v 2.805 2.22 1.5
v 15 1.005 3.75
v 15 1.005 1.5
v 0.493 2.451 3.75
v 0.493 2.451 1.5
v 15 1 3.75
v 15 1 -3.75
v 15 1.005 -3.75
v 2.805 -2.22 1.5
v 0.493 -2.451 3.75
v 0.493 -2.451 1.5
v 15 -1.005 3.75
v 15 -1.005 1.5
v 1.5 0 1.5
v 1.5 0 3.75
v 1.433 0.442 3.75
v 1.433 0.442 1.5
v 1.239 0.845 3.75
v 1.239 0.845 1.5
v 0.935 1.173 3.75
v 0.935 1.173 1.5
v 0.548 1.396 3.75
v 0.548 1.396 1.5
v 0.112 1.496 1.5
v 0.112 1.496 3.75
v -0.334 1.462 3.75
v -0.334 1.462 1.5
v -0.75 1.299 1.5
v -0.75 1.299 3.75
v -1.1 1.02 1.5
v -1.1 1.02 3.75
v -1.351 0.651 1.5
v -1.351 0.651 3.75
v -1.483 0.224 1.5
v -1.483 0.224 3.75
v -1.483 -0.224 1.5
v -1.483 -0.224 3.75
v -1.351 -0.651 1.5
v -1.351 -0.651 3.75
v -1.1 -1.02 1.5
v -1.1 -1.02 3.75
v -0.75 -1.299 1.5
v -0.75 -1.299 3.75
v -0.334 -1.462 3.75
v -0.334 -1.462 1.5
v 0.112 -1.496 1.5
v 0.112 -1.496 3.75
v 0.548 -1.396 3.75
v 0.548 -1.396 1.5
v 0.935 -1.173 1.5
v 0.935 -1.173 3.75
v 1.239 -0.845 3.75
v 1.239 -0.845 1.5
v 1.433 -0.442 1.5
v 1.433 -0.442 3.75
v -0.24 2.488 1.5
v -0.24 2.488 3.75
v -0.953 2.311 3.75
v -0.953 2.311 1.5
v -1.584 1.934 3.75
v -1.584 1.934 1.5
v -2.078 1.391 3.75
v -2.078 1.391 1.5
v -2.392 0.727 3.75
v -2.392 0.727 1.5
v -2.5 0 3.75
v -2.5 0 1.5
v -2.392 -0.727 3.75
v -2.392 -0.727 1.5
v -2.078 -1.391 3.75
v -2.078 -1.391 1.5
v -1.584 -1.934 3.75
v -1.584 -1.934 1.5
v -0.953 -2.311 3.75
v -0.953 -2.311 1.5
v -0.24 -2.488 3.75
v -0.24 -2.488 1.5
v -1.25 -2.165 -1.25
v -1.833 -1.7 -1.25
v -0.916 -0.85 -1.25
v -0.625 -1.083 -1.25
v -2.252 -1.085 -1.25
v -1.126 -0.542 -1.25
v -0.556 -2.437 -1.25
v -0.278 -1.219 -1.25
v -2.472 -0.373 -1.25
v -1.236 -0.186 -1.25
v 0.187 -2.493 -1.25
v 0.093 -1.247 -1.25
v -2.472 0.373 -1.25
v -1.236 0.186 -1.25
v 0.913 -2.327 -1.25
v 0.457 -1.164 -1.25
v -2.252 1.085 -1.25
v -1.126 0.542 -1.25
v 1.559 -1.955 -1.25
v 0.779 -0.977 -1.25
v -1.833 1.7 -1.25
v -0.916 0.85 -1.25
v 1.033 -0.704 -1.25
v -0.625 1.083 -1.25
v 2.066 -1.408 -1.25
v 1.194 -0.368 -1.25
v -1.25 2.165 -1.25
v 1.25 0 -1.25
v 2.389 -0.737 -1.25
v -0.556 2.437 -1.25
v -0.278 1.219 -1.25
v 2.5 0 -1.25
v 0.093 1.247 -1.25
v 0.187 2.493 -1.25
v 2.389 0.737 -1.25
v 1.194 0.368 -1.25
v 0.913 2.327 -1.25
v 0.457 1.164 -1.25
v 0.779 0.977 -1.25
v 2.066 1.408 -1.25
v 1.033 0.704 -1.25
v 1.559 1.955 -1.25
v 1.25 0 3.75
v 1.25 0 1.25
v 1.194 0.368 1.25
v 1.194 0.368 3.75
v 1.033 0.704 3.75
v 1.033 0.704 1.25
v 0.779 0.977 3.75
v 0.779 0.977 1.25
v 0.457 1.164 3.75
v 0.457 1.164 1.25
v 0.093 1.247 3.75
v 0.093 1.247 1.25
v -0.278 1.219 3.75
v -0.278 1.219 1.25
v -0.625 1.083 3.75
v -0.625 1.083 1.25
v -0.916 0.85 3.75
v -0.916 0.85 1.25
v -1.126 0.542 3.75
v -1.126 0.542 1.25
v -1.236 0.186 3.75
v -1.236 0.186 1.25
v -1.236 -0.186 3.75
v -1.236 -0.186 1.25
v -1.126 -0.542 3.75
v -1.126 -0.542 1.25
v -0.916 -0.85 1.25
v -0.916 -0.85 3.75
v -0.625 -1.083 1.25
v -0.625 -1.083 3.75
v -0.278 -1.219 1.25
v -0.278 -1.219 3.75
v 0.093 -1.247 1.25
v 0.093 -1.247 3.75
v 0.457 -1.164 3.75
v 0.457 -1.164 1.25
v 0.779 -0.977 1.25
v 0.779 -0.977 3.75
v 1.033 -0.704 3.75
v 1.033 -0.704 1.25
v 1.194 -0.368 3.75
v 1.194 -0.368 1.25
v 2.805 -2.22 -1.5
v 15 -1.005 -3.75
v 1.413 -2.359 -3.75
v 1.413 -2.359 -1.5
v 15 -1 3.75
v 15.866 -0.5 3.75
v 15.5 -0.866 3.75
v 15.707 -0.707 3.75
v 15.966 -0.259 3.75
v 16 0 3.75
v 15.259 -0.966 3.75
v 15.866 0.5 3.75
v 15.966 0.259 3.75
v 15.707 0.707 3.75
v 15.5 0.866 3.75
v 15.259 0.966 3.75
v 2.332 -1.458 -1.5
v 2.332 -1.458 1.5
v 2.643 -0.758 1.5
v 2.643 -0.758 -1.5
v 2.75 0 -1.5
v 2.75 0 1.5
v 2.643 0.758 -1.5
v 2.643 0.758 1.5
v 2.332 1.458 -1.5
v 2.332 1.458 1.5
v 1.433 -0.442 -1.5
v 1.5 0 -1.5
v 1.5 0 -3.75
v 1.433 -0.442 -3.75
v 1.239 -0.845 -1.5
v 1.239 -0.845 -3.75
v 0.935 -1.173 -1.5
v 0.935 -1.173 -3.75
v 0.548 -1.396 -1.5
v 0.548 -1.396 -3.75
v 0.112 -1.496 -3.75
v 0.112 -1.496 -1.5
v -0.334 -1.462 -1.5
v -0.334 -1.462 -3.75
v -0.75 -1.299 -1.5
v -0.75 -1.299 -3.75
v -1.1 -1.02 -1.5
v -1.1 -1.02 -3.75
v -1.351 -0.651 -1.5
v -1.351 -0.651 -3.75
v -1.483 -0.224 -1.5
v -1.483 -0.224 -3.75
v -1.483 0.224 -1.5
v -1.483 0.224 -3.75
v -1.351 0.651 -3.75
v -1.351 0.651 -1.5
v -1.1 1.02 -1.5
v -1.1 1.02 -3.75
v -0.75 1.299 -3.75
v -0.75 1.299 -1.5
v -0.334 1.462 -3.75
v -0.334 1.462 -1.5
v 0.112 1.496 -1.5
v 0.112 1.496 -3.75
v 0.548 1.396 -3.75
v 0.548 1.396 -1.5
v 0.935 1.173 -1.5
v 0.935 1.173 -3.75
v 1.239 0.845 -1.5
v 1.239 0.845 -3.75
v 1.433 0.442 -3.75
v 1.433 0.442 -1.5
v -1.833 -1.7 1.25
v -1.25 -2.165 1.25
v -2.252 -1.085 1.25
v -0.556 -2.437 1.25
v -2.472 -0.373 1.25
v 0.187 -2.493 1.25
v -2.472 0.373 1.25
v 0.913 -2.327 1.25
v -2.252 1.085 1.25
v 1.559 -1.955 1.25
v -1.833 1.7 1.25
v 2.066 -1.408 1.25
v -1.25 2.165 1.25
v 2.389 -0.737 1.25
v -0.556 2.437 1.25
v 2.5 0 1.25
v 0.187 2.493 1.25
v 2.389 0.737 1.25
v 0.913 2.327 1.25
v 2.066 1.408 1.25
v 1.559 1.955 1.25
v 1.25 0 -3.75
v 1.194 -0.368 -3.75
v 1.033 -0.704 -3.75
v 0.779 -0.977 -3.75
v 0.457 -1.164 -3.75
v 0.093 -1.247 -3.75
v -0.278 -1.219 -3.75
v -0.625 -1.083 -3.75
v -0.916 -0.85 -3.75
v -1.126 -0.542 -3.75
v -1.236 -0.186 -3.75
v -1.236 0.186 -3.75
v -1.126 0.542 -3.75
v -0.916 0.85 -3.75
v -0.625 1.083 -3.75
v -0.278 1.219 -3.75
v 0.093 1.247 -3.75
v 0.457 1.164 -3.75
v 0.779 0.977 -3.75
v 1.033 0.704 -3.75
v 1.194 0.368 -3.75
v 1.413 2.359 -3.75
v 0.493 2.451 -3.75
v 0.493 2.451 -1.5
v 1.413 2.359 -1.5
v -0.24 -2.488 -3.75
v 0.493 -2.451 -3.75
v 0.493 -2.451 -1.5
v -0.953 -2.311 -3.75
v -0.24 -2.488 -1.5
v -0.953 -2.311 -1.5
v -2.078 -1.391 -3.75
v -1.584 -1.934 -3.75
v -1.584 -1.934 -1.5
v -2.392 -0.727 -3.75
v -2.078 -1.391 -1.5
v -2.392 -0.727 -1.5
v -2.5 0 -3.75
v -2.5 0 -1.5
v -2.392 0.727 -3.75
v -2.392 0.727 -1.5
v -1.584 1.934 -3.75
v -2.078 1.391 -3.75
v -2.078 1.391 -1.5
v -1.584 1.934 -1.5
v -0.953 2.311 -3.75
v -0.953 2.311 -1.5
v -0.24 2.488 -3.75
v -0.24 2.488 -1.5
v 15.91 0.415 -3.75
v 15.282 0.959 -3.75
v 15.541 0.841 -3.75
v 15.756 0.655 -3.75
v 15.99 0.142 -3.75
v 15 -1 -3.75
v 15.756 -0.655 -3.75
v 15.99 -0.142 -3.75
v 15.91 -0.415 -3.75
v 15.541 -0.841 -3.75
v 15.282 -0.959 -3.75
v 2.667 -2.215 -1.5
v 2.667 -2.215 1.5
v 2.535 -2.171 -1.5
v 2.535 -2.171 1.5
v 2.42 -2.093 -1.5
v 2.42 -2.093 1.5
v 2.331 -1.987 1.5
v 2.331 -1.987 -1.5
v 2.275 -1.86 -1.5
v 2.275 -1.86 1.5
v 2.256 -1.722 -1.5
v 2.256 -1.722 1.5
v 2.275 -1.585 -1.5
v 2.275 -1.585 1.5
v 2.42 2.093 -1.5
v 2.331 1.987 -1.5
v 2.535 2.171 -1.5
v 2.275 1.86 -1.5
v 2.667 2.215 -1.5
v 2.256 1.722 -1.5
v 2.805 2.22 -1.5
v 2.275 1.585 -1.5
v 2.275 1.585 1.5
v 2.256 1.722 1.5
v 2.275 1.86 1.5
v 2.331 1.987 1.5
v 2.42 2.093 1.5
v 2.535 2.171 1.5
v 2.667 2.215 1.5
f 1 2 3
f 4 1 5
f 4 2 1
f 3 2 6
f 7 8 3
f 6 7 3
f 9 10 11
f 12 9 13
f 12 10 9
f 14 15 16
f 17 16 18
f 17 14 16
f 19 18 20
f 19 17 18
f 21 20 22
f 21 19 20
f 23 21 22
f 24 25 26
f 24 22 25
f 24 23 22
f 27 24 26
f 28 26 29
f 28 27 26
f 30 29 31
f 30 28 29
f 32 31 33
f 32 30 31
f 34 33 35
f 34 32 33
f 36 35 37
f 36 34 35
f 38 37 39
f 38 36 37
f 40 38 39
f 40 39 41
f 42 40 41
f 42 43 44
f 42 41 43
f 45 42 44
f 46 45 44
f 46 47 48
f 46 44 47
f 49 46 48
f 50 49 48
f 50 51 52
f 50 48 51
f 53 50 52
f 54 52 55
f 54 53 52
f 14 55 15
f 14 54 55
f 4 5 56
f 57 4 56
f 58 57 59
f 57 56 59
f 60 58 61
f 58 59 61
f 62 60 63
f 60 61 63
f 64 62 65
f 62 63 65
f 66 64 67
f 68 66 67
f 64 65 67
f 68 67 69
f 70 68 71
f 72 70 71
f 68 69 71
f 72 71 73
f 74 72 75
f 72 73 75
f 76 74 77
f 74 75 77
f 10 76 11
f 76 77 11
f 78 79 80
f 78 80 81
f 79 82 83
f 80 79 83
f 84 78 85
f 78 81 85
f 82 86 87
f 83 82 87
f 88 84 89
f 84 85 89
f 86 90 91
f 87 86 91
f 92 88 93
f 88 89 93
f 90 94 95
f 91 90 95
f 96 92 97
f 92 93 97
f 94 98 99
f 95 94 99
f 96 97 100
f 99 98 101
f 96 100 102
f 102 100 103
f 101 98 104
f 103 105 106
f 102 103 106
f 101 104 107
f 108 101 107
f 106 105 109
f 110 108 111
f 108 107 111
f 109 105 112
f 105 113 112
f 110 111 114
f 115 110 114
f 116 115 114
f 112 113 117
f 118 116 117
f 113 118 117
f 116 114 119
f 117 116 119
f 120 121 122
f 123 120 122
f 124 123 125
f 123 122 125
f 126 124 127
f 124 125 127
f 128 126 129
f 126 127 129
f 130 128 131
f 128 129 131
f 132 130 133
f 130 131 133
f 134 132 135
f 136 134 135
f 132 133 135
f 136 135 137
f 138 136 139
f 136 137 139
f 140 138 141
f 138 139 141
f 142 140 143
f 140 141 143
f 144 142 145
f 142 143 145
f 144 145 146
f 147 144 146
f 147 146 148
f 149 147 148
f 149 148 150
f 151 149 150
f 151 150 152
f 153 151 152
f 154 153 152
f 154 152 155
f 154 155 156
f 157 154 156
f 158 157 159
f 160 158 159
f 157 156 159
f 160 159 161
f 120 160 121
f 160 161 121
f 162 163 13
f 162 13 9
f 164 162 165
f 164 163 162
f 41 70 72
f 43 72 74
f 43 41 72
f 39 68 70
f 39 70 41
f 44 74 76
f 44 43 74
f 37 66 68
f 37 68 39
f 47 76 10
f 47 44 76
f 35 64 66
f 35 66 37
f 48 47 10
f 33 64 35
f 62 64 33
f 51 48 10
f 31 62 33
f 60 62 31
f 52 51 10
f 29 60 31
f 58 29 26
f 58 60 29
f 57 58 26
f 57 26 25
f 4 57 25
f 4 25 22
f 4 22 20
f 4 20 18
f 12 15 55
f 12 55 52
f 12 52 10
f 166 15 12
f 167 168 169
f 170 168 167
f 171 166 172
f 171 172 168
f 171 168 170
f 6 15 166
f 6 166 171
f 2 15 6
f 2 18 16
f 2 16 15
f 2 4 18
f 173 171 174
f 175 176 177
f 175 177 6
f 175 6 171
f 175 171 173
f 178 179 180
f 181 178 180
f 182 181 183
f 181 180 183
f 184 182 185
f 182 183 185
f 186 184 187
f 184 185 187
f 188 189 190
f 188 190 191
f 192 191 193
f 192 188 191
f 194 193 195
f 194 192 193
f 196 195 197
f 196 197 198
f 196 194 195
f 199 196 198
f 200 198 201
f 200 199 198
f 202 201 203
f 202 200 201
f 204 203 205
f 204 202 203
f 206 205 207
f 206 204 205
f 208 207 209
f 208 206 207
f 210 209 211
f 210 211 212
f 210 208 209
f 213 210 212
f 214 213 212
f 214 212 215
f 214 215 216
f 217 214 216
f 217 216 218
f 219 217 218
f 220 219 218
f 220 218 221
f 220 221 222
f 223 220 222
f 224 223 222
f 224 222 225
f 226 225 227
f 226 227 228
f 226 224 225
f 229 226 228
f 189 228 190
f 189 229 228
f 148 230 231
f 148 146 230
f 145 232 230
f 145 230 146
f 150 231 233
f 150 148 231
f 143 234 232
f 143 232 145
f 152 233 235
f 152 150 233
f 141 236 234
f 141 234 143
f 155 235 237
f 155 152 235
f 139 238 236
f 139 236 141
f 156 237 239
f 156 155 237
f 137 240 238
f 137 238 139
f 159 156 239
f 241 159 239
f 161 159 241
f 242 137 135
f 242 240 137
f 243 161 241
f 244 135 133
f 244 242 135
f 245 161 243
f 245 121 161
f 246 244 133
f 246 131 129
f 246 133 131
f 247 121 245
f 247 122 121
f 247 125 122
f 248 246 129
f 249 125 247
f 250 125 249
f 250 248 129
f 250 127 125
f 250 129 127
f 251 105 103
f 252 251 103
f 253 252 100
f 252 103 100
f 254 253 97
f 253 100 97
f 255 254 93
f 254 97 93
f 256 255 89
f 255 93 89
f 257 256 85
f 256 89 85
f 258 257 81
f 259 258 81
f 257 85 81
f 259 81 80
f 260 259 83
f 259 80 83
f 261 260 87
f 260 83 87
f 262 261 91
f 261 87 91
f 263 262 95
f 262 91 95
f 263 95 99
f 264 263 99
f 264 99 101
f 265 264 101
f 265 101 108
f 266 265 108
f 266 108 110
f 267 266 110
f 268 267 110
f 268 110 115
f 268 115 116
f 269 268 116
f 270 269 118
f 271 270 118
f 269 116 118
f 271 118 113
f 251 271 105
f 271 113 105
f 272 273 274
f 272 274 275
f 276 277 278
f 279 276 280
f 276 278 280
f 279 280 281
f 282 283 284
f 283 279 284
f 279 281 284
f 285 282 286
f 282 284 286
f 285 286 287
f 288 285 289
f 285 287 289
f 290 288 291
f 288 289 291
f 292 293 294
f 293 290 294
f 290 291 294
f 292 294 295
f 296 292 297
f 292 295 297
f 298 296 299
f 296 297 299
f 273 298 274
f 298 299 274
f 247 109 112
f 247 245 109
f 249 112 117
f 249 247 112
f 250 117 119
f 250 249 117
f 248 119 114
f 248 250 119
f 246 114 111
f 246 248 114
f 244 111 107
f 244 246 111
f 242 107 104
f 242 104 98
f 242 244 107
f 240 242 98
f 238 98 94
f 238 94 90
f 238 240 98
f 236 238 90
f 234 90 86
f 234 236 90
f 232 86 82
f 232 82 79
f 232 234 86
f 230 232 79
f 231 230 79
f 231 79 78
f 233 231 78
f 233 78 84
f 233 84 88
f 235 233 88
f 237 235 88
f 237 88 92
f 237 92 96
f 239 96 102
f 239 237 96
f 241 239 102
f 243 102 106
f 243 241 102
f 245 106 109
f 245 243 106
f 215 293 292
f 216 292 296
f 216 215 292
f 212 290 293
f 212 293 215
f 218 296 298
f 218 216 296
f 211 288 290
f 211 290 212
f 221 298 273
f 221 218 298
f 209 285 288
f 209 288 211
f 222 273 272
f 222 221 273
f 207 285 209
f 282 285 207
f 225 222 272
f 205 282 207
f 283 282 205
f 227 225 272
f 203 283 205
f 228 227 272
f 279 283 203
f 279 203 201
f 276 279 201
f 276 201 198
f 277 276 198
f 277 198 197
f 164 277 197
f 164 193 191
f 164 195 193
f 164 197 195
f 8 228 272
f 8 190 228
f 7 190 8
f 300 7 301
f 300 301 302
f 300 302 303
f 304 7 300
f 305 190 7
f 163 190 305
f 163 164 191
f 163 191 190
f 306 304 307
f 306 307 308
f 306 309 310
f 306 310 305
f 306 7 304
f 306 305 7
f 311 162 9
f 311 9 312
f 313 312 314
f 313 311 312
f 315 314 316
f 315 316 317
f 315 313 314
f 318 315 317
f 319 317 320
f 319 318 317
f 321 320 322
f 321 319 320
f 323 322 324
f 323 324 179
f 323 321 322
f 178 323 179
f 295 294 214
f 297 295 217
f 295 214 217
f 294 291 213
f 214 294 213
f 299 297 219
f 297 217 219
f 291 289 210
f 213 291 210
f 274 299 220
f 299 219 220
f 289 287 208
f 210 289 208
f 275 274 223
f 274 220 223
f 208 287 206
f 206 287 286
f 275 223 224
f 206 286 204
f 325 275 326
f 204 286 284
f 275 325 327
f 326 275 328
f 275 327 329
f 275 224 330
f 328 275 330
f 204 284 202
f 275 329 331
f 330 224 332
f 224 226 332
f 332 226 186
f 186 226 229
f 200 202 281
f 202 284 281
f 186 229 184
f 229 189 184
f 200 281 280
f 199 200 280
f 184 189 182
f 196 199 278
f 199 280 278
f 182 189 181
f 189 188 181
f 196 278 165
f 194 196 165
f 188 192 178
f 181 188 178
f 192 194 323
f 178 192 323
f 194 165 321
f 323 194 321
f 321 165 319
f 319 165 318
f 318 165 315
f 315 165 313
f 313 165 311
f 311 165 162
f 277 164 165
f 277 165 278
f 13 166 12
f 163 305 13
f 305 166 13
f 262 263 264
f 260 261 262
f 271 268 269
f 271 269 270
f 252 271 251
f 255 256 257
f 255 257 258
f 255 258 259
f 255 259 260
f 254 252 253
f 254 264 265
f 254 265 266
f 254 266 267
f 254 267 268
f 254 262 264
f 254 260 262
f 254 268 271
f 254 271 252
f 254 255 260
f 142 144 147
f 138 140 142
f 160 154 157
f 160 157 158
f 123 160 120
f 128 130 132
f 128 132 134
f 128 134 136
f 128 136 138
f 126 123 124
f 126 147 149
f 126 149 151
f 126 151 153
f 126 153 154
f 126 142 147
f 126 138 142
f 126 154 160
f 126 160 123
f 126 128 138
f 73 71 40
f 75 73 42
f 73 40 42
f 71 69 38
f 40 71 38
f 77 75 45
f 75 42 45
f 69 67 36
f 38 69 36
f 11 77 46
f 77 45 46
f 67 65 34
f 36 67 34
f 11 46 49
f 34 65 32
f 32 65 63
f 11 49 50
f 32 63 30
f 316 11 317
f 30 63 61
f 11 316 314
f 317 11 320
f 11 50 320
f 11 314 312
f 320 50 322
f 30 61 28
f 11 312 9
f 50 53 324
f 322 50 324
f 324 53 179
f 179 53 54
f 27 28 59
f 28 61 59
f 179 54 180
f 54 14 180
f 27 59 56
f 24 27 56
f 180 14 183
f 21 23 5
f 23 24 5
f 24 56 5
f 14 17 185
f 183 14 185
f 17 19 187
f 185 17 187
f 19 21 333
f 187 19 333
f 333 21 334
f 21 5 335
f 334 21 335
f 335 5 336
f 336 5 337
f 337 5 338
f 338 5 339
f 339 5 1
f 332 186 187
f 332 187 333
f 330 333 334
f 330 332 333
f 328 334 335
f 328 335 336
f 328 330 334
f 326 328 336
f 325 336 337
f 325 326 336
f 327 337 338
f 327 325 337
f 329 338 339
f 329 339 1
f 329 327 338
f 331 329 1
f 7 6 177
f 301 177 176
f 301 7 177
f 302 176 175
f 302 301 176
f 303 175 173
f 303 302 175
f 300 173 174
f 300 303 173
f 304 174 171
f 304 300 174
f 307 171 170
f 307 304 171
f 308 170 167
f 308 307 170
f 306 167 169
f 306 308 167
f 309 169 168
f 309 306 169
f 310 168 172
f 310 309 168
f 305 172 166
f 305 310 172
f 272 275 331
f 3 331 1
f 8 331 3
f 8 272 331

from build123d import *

# Parameters (mm, degrees)
F0_R         = 2.5
F1_DEPTH     = 1.25
F2_R         = 1.25
F3_DEPTH     = 2.5
F4_R         = 1.25
F5_DEPTH     = 2.5
F7_R         = 2.5
F7_R_2       = 1.5
F8_DEPTH     = 2.25
F10_R        = 2.5
F10_R_2      = 1.5
F11_DEPTH    = 2.25
F13_DEPTH    = 2.25
F15_DEPTH    = 3
F16_R        = 1.5
F17_DEPTH    = 2.25
F18_T1_DEPTH = 3


# Not quite as in the source:
# - a fillet or chamfer that OpenCascade refuses, or shapes differently, is made with other operations: its cross-section is extruded or revolved along the edge and cut away or added


with BuildPart() as f1:
    # F0 (on Top) → F1 (new body, symmetric)
    with BuildSketch(Plane.XY):
        Circle(F0_R)
    extrude(amount=F1_DEPTH, both=True)

    # F2 (on face) → F3 (join)
    with BuildSketch(Plane.XY.offset(1.25)):
        Circle(F2_R)
    extrude(amount=F3_DEPTH)

    # F4 (on face) → F5 (join)
    with BuildSketch(Plane(origin=(0, 0, -1.25), x_dir=(1, 0, 0), z_dir=(0, 0, -1))):
        Circle(F4_R)
    extrude(amount=F5_DEPTH)


with BuildPart() as f8:
    # F7 (on offset) → F8 (new body)
    with BuildSketch(Plane.XY.offset(1.5)):
        Circle(F7_R)
        Circle(F7_R_2, mode=Mode.SUBTRACT)
    extrude(amount=F8_DEPTH)

    # F12 (on face) → F13 (join, through all)
    with BuildSketch(Plane.XY.offset(3.75)):
        with BuildLine():
            ThreePointArc((15, -1), (14, 0), (15, 1))
            Line((15, 1), (15, 1.0049547481))
            Line((15, 1.0049547481), (0.4934464972, 2.4508183438))
            ThreePointArc((0.4934464972, 2.4508183438), (1.9343753828, 1.5837272109), (2.5, 0))
            ThreePointArc((2.5, 0), (1.9343753828, -1.5837272109), (0.4934464972, -2.4508183438))
            Line((0.4934464972, -2.4508183438), (15, -1.0049547481))
            Line((15, -1.0049547481), (15, -1))
        make_face()
        with BuildLine():
            ThreePointArc((2.5, 0), (1.9343753828, 1.5837272109), (0.4934464972, 2.4508183438))
            Line((0.4934464972, 2.4508183438), (0, 2.5))
            Line((0, 2.5), (0, 1.5))
            ThreePointArc((0, 1.5), (1.0606601718, 1.0606601718), (1.5, 0))
            ThreePointArc((1.5, 0), (1.0606601718, -1.0606601718), (0, -1.5))
            Line((0, -1.5), (0, -2.5))
            Line((0, -2.5), (0.4934464972, -2.4508183438))
            ThreePointArc((0.4934464972, -2.4508183438), (1.9343753828, -1.5837272109), (2.5, 0))
        make_face()
        with BuildLine():
            Line((0, 1.5), (0, 2.5))
            ThreePointArc((0, 2.5), (-2.5, 0), (0, -2.5))
            Line((0, -2.5), (0, -1.5))
            ThreePointArc((0, -1.5), (-1.5, 0), (0, 1.5))
        make_face()
        with BuildLine():
            ThreePointArc((15, -1), (15.7071067812, -0.7071067812), (16, 0))
            ThreePointArc((16, 0), (15.7071067812, 0.7071067812), (15, 1))
            Line((15, 1), (15, -1))
        make_face()
        with BuildLine():
            Line((15, -1), (15, 1))
            ThreePointArc((15, 1), (14, 0), (15, -1))
        make_face()
    extrude(amount=-F13_DEPTH)

    # F14 (on face) → F15 (join, through all)
    with BuildSketch(Plane(origin=(0, 0, 1.5), x_dir=(1, 0, 0), z_dir=(0, 0, -1))):
        with BuildLine():
            Line((15, 1), (15, 1.0049547481))
            Line((15, 1.0049547481), (1.4131117673, 2.3591555975))
            ThreePointArc((1.4131117673, 2.3591555975), (2.75, 0), (1.4131117673, -2.3591555975))
            Line((1.4131117673, -2.3591555975), (15, -1.0049547481))
            Line((15, -1.0049547481), (15, -1))
            ThreePointArc((15, -1), (16, 0), (15, 1))
        make_face()
    extrude(amount=F15_DEPTH)



with BuildPart() as f11:
    # F10 (on offset) → F11 (new body)
    with BuildSketch(Plane(origin=(0, 0, -1.5), x_dir=(1, 0, 0), z_dir=(0, 0, -1))):
        Circle(F10_R)
        Circle(F10_R_2, mode=Mode.SUBTRACT)
    extrude(amount=F11_DEPTH)


with BuildPart() as f8_1:
    add(f8.part)

    add(f11.part)  # F17 merges F11
    # F16 (on face) → F17 (join, through all)
    with BuildSketch(Plane(origin=(0, 0, -3.75), x_dir=(1, 0, 0), z_dir=(0, 0, -1))):
        with BuildLine():
            Line((0.4934464972, -2.4508183438), (1.4131117673, -2.3591555975))
            ThreePointArc((1.4131117673, -2.3591555975), (2.75, 0), (1.4131117673, 2.3591555975))
            Line((1.4131117673, 2.3591555975), (0.4934464972, 2.4508183438))
            ThreePointArc((0.4934464972, 2.4508183438), (1.9343753828, 1.5837272109), (2.5, 0))
            ThreePointArc((2.5, 0), (1.9343753828, -1.5837272109), (0.4934464972, -2.4508183438))
        make_face()
        with BuildLine():
            Line((0, -2.5), (0.4934464972, -2.4508183438))
            ThreePointArc((0.4934464972, -2.4508183438), (1.9343753828, -1.5837272109), (2.5, 0))
            ThreePointArc((2.5, 0), (1.9343753828, 1.5837272109), (0.4934464972, 2.4508183438))
            Line((0.4934464972, 2.4508183438), (0, 2.5))
            ThreePointArc((0, 2.5), (-2.5, 0), (0, -2.5))
        make_face()
        Circle(F16_R, mode=Mode.SUBTRACT)
        with BuildLine():
            Line((15, -1.0049547481), (15, -1))
            ThreePointArc((15, -1), (16, 0), (15, 1))
            Line((15, 1), (15, 1.0049547481))
            Line((15, 1.0049547481), (1.4131117673, 2.3591555975))
            ThreePointArc((1.4131117673, 2.3591555975), (2.75, 0), (1.4131117673, -2.3591555975))
            Line((1.4131117673, -2.3591555975), (15, -1.0049547481))
        make_face()
    extrude(amount=-F17_DEPTH)

    # F18: fillet of radius 0.5 on 2 edges, made by hand

    # F18_s2 → F18_t1 (cut)
    with BuildSketch(Plane.XY.offset(-1.5)):
        with BuildLine():
            ThreePointArc((2.3318052613, 1.4578011604), (2.331005251, 1.986626711), (2.8053589943, 2.2203907571))
            Line((2.8053589943, 2.2203907571), (1.4131117673, 2.3591555975))
            ThreePointArc((1.4131117673, 2.3591555975), (1.9259311626, 1.9629796629), (2.3318052613, 1.4578011604))
        make_face()
        with BuildLine():
            ThreePointArc((2.8053589943, -2.2203907571), (2.331005251, -1.986626711), (2.3318052613, -1.4578011604))
            ThreePointArc((2.3318052613, -1.4578011604), (1.9259311626, -1.9629796629), (1.4131117673, -2.3591555975))
            Line((1.4131117673, -2.3591555975), (2.8053589943, -2.2203907571))
        make_face()
    extrude(amount=F18_T1_DEPTH, mode=Mode.SUBTRACT)


solid = Compound([f1.part, f8_1.part])
